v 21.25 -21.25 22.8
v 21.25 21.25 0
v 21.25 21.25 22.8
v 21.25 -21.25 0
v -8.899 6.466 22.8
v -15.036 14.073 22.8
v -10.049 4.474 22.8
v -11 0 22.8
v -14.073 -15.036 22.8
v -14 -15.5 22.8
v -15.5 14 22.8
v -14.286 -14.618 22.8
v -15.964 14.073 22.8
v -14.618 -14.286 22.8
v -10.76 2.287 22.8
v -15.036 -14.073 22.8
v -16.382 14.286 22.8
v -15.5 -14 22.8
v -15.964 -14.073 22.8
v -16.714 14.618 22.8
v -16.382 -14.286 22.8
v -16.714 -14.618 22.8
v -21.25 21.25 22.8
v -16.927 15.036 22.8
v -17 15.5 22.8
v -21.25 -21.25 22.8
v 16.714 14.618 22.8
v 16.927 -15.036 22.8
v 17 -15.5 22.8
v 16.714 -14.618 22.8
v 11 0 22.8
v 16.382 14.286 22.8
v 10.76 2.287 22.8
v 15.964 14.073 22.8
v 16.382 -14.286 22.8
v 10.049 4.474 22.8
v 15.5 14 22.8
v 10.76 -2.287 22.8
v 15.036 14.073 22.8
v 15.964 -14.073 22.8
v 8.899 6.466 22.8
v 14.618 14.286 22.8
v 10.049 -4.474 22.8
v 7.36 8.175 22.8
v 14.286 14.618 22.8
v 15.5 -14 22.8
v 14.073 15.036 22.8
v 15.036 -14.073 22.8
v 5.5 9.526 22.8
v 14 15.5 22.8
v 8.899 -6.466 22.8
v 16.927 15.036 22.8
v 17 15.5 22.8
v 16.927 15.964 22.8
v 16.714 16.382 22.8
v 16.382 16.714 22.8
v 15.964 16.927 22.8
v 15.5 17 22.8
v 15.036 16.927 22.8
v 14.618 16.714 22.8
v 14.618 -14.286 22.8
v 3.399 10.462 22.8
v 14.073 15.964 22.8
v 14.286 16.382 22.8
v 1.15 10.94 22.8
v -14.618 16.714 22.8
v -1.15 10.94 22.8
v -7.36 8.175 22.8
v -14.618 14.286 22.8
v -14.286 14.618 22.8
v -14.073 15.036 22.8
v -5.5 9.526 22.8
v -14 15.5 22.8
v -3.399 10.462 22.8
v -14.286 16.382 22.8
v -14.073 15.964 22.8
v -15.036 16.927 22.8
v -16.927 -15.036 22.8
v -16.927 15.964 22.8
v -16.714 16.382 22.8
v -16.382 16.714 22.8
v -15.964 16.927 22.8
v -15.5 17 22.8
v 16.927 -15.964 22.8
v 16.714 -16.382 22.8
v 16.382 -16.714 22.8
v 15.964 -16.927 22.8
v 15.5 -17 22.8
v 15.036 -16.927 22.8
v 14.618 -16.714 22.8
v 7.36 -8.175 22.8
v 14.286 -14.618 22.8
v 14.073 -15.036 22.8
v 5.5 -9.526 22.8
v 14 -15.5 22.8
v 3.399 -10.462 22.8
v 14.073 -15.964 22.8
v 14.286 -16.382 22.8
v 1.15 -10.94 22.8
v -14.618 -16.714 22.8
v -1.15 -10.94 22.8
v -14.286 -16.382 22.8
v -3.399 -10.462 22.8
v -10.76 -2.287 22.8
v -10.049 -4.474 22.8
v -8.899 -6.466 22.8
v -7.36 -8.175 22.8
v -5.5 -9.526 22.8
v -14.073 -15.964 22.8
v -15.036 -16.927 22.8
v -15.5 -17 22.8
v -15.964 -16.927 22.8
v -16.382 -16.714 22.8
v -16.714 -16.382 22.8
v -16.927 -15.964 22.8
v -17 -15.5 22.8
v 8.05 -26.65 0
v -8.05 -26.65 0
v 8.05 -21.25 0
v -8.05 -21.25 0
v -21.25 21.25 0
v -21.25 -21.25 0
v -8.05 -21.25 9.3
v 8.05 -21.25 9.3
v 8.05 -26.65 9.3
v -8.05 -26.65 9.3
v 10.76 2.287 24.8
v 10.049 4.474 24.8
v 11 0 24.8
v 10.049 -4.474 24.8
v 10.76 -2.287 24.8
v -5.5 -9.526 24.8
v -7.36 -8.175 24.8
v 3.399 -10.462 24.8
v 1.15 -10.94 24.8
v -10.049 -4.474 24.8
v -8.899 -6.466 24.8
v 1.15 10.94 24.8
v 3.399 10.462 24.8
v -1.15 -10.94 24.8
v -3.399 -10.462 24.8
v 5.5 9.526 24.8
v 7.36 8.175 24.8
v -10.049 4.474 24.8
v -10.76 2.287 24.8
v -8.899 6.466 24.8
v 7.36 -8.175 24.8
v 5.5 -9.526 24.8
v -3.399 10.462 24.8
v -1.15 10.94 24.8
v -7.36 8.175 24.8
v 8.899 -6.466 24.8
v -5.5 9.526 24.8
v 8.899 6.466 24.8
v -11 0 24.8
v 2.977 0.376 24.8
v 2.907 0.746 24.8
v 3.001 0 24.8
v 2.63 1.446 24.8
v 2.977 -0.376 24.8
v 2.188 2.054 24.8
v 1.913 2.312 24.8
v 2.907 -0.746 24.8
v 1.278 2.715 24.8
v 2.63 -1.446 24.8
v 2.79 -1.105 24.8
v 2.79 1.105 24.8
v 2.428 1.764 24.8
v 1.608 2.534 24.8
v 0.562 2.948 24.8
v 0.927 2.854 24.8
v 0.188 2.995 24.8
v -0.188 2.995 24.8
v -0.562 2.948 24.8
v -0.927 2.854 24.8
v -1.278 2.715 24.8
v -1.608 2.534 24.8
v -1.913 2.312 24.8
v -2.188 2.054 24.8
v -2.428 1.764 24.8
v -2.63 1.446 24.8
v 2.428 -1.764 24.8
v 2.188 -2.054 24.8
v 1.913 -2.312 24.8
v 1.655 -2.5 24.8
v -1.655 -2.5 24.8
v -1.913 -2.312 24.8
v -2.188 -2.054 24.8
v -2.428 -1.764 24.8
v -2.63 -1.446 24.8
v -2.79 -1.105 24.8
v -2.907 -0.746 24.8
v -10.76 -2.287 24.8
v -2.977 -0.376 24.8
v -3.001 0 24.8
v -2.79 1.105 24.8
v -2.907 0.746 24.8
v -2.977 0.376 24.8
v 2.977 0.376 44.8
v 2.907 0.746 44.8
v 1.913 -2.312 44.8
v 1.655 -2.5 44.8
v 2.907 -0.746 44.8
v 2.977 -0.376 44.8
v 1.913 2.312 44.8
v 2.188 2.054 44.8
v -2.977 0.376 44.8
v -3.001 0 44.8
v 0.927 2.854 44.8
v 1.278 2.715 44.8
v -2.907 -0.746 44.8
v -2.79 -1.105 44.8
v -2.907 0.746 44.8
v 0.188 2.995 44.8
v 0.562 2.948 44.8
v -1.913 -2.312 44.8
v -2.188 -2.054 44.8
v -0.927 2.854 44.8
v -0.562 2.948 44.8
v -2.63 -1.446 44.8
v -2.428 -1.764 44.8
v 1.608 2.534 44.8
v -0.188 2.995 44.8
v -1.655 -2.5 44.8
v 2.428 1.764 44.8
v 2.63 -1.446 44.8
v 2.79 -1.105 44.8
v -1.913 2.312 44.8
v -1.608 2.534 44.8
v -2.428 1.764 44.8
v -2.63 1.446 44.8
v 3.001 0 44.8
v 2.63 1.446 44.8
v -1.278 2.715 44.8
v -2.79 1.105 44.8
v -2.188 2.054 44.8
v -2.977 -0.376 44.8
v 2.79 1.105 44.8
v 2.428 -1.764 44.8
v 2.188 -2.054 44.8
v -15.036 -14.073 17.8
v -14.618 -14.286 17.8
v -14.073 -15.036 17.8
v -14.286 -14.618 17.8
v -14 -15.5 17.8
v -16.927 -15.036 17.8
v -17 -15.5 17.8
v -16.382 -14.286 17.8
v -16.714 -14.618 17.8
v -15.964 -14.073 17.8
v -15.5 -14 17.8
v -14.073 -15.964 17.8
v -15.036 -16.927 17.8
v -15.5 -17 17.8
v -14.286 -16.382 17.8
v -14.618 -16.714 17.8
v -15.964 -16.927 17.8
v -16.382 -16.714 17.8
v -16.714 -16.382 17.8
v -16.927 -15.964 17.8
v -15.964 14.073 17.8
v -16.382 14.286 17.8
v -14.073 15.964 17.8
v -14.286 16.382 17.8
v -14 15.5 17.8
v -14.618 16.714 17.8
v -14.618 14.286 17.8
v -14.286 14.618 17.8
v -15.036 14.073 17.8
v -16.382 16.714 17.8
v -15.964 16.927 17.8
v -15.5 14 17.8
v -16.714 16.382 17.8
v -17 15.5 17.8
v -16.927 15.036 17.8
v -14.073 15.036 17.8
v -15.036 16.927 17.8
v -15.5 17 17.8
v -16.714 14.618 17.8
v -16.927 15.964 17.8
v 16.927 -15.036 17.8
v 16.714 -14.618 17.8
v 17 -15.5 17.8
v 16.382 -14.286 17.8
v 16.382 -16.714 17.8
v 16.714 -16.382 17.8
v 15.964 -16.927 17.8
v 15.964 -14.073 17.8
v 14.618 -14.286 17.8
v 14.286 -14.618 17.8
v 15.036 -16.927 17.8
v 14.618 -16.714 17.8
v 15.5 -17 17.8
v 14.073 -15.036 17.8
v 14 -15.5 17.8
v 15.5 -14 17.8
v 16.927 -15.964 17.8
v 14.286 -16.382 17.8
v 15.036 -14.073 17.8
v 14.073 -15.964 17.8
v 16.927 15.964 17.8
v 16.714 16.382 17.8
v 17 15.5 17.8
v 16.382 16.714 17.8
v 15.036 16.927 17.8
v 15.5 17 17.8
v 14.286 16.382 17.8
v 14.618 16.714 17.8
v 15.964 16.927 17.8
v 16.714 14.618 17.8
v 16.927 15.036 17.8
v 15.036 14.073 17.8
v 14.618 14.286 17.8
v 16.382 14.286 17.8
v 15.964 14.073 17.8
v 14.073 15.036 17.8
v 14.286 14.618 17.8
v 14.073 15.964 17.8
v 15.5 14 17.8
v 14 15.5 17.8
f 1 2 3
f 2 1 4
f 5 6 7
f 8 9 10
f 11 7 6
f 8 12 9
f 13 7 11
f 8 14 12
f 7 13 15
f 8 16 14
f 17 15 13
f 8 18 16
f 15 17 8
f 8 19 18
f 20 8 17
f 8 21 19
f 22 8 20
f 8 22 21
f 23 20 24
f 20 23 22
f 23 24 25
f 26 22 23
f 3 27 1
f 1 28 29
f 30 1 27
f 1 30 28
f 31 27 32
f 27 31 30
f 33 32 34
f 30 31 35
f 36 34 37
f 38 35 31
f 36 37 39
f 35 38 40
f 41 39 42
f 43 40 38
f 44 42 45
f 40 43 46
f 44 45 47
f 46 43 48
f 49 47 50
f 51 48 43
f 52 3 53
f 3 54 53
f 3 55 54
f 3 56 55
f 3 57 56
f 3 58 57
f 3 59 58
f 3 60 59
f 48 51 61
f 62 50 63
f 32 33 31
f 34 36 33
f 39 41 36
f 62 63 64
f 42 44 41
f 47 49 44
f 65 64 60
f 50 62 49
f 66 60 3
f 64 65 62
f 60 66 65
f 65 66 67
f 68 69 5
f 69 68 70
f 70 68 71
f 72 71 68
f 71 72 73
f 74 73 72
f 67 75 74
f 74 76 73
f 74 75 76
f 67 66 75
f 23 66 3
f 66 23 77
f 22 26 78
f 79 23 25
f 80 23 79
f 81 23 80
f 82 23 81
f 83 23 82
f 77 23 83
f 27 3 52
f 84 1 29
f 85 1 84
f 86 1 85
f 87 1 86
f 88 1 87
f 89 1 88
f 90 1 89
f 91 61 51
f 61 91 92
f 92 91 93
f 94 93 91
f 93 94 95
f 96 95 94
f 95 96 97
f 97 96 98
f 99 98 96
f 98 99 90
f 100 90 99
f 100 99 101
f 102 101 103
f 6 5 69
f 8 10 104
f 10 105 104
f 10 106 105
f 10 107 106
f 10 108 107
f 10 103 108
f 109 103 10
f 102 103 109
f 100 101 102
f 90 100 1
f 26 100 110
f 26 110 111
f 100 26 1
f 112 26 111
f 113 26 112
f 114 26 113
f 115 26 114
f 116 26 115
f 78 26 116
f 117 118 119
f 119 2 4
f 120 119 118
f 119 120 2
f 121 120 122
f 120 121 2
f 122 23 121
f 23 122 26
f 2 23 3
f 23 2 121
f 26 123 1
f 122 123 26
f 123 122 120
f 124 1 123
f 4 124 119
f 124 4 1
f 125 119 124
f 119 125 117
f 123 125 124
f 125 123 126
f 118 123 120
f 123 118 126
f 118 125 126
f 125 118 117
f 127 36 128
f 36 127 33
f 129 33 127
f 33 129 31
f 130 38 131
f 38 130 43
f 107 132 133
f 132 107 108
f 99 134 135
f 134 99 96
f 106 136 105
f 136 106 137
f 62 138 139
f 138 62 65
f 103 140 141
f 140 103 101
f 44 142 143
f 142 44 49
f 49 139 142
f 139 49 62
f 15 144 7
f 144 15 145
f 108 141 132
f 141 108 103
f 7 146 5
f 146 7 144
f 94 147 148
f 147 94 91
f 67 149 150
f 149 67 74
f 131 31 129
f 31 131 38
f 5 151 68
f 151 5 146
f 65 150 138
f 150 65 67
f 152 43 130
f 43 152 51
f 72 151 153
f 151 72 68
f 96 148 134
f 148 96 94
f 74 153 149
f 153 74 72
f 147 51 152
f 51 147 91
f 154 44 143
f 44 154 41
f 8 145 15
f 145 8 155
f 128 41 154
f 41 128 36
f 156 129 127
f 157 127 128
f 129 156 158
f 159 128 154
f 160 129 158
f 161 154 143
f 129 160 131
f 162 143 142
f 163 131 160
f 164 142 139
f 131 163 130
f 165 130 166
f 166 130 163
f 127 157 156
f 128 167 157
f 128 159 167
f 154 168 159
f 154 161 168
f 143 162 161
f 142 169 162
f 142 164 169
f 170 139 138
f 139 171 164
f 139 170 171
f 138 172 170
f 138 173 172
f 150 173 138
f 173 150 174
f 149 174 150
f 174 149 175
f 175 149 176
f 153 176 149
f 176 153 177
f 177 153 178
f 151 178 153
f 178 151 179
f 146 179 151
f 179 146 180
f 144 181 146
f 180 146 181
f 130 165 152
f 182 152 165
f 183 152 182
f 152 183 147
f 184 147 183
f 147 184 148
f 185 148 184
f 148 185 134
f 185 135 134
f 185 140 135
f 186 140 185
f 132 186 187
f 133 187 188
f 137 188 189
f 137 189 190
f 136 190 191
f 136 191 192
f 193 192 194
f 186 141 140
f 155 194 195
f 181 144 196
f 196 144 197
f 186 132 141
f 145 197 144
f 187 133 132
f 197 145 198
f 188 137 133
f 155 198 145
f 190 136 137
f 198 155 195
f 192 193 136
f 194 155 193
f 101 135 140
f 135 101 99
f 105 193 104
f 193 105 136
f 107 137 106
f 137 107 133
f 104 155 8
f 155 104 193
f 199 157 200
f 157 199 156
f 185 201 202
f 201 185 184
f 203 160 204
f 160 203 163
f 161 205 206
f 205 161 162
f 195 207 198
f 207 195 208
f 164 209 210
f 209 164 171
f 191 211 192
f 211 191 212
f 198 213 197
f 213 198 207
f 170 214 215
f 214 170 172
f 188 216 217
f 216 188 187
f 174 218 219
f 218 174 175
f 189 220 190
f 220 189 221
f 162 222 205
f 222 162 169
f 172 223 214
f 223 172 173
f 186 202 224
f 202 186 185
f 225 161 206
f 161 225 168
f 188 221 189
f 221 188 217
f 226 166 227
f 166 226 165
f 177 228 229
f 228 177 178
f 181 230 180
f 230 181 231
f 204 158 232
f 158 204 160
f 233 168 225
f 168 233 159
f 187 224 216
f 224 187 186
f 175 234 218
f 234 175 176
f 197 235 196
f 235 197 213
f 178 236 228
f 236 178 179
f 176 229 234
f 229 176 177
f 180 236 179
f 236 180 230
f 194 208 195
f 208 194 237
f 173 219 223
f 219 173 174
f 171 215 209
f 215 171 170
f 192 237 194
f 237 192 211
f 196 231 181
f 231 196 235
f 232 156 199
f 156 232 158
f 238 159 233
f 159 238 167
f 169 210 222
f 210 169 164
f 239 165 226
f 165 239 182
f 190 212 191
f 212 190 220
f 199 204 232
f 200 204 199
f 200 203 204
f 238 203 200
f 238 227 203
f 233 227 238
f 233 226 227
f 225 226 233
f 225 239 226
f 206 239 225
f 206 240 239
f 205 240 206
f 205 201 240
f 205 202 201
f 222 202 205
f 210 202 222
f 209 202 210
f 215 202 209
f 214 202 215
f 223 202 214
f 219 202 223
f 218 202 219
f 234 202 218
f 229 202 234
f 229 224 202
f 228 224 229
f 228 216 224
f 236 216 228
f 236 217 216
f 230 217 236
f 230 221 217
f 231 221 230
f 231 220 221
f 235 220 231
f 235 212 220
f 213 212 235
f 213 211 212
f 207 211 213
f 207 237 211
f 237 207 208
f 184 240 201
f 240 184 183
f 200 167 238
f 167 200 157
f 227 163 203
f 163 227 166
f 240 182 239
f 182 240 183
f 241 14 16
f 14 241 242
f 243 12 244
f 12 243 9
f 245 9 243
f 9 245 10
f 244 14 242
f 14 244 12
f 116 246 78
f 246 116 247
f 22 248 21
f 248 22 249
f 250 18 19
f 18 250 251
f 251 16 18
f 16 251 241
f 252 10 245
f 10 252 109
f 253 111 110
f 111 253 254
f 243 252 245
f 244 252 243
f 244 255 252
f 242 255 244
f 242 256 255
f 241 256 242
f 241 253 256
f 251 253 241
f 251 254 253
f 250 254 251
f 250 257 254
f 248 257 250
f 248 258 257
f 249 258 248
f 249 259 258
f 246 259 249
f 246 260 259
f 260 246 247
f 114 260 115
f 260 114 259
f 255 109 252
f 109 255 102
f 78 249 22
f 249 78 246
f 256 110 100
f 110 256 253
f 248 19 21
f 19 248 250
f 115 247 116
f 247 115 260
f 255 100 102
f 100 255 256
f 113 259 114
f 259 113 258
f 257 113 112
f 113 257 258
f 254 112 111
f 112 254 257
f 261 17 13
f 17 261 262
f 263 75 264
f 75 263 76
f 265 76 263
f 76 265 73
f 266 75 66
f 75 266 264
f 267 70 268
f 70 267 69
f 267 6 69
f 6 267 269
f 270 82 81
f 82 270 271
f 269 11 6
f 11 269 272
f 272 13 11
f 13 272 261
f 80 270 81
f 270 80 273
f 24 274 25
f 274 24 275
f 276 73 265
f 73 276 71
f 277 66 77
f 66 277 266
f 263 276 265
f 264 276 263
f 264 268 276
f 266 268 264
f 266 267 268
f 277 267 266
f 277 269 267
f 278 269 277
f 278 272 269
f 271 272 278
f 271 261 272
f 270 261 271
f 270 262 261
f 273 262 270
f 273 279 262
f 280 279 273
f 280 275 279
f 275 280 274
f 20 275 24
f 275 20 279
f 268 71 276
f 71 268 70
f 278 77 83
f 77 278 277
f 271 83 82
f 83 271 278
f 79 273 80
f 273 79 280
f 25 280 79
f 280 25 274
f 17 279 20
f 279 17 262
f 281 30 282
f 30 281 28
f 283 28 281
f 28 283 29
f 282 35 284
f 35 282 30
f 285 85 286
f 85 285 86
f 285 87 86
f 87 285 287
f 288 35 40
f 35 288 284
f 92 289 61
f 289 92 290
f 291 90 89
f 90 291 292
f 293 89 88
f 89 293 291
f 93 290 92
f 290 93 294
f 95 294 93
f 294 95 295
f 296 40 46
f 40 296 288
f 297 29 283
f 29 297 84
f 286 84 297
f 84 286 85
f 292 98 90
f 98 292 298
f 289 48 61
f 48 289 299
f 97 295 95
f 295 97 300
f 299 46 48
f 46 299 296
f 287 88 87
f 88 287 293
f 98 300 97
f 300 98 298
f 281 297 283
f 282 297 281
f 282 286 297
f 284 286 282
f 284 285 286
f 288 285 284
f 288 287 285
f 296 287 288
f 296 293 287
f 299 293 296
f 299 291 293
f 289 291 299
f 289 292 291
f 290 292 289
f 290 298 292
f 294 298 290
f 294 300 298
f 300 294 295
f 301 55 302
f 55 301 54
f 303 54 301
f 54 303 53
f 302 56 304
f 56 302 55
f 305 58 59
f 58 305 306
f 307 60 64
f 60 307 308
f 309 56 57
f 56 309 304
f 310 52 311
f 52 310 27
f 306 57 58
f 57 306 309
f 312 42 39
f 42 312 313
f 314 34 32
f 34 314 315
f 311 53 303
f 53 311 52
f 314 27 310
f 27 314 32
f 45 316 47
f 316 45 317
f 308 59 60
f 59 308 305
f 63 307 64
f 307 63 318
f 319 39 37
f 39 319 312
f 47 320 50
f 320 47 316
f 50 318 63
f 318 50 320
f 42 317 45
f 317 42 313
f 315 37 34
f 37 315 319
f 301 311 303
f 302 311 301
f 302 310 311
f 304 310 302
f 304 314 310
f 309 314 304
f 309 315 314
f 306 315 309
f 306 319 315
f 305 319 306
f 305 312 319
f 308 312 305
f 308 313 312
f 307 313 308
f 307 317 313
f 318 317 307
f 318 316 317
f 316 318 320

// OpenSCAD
// file: fn.scad
// return:
// x - for small values
// some fraction of x (>=16) - for larger values
function fn_preview_(x) = min( max(16, 0.2*x), x );
assert( fn_preview_(10) == 10 );
assert( fn_preview_(16) == 16 );
assert( fn_preview_(90)  > 16 );

// helper functions to define $fn=... to do less precise math
// in a preview mode. example usage:
//   sphere(r=50, $fn=fn(1000));
// would generate $fn=1000 when generating model, but $fn < 1000
// for preview mode. note that for small $fn's value is untouched.
function fn(x) = $preview ? fn_preview_(x) : x;
// main file
use <fn.scad>

eps = 0.01;


module stepper_mount_holes_template(h=22.8)
{
  span = 31;
  for(ix=[-1, +1])
    for(iy=[-1, +1])
      translate(span/2*[ix, iy, 0] + [0, 0, h])
        children();
}

module stepper_shaft_slot(h, spacing)
{
  d = 5;
  cut = 0.5;
  linear_extrude(h)
    offset(delta=spacing)
      difference()
      {
        circle(d=d, $fn=fn(50));
        translate([-d/2, -3/2*d +cut])
          square([d, d]);
      }
}


module stepper_mock_nema17(h, rod_len)
{
  module body()
  {
    module shaft(l)
    {
      stepper_shaft_slot(h=l, spacing=0.5);
    }

    side = 42.5;
    translate(-0.5*[side, side, 0])
      cube([side, side, h]);
    // power connector
    {
      pc_size = [16.1, 5.4, 9.3];
      translate([-0.5*pc_size[0], -side/2-pc_size.y, 0])
        cube(pc_size);
    }
    // center berring cover
    cbh = 2;
    translate([0, 0, h])
      cylinder(d=22, h=cbh, $fn=fn(30));
    shaft(l = h + cbh + rod_len);
  }
  
  difference()
  {
    body();
    stepper_mount_holes_template()
      translate([0, 0, -5])
        cylinder(d=3, h=5+eps, $fn=fn(20));
  }
}


module stepper_mock_17hs4023()
{
  stepper_mock_nema17(h=22.8, rod_len=20);
}


//rotate([0, -90, 0])
  stepper_mock_17hs4023();
